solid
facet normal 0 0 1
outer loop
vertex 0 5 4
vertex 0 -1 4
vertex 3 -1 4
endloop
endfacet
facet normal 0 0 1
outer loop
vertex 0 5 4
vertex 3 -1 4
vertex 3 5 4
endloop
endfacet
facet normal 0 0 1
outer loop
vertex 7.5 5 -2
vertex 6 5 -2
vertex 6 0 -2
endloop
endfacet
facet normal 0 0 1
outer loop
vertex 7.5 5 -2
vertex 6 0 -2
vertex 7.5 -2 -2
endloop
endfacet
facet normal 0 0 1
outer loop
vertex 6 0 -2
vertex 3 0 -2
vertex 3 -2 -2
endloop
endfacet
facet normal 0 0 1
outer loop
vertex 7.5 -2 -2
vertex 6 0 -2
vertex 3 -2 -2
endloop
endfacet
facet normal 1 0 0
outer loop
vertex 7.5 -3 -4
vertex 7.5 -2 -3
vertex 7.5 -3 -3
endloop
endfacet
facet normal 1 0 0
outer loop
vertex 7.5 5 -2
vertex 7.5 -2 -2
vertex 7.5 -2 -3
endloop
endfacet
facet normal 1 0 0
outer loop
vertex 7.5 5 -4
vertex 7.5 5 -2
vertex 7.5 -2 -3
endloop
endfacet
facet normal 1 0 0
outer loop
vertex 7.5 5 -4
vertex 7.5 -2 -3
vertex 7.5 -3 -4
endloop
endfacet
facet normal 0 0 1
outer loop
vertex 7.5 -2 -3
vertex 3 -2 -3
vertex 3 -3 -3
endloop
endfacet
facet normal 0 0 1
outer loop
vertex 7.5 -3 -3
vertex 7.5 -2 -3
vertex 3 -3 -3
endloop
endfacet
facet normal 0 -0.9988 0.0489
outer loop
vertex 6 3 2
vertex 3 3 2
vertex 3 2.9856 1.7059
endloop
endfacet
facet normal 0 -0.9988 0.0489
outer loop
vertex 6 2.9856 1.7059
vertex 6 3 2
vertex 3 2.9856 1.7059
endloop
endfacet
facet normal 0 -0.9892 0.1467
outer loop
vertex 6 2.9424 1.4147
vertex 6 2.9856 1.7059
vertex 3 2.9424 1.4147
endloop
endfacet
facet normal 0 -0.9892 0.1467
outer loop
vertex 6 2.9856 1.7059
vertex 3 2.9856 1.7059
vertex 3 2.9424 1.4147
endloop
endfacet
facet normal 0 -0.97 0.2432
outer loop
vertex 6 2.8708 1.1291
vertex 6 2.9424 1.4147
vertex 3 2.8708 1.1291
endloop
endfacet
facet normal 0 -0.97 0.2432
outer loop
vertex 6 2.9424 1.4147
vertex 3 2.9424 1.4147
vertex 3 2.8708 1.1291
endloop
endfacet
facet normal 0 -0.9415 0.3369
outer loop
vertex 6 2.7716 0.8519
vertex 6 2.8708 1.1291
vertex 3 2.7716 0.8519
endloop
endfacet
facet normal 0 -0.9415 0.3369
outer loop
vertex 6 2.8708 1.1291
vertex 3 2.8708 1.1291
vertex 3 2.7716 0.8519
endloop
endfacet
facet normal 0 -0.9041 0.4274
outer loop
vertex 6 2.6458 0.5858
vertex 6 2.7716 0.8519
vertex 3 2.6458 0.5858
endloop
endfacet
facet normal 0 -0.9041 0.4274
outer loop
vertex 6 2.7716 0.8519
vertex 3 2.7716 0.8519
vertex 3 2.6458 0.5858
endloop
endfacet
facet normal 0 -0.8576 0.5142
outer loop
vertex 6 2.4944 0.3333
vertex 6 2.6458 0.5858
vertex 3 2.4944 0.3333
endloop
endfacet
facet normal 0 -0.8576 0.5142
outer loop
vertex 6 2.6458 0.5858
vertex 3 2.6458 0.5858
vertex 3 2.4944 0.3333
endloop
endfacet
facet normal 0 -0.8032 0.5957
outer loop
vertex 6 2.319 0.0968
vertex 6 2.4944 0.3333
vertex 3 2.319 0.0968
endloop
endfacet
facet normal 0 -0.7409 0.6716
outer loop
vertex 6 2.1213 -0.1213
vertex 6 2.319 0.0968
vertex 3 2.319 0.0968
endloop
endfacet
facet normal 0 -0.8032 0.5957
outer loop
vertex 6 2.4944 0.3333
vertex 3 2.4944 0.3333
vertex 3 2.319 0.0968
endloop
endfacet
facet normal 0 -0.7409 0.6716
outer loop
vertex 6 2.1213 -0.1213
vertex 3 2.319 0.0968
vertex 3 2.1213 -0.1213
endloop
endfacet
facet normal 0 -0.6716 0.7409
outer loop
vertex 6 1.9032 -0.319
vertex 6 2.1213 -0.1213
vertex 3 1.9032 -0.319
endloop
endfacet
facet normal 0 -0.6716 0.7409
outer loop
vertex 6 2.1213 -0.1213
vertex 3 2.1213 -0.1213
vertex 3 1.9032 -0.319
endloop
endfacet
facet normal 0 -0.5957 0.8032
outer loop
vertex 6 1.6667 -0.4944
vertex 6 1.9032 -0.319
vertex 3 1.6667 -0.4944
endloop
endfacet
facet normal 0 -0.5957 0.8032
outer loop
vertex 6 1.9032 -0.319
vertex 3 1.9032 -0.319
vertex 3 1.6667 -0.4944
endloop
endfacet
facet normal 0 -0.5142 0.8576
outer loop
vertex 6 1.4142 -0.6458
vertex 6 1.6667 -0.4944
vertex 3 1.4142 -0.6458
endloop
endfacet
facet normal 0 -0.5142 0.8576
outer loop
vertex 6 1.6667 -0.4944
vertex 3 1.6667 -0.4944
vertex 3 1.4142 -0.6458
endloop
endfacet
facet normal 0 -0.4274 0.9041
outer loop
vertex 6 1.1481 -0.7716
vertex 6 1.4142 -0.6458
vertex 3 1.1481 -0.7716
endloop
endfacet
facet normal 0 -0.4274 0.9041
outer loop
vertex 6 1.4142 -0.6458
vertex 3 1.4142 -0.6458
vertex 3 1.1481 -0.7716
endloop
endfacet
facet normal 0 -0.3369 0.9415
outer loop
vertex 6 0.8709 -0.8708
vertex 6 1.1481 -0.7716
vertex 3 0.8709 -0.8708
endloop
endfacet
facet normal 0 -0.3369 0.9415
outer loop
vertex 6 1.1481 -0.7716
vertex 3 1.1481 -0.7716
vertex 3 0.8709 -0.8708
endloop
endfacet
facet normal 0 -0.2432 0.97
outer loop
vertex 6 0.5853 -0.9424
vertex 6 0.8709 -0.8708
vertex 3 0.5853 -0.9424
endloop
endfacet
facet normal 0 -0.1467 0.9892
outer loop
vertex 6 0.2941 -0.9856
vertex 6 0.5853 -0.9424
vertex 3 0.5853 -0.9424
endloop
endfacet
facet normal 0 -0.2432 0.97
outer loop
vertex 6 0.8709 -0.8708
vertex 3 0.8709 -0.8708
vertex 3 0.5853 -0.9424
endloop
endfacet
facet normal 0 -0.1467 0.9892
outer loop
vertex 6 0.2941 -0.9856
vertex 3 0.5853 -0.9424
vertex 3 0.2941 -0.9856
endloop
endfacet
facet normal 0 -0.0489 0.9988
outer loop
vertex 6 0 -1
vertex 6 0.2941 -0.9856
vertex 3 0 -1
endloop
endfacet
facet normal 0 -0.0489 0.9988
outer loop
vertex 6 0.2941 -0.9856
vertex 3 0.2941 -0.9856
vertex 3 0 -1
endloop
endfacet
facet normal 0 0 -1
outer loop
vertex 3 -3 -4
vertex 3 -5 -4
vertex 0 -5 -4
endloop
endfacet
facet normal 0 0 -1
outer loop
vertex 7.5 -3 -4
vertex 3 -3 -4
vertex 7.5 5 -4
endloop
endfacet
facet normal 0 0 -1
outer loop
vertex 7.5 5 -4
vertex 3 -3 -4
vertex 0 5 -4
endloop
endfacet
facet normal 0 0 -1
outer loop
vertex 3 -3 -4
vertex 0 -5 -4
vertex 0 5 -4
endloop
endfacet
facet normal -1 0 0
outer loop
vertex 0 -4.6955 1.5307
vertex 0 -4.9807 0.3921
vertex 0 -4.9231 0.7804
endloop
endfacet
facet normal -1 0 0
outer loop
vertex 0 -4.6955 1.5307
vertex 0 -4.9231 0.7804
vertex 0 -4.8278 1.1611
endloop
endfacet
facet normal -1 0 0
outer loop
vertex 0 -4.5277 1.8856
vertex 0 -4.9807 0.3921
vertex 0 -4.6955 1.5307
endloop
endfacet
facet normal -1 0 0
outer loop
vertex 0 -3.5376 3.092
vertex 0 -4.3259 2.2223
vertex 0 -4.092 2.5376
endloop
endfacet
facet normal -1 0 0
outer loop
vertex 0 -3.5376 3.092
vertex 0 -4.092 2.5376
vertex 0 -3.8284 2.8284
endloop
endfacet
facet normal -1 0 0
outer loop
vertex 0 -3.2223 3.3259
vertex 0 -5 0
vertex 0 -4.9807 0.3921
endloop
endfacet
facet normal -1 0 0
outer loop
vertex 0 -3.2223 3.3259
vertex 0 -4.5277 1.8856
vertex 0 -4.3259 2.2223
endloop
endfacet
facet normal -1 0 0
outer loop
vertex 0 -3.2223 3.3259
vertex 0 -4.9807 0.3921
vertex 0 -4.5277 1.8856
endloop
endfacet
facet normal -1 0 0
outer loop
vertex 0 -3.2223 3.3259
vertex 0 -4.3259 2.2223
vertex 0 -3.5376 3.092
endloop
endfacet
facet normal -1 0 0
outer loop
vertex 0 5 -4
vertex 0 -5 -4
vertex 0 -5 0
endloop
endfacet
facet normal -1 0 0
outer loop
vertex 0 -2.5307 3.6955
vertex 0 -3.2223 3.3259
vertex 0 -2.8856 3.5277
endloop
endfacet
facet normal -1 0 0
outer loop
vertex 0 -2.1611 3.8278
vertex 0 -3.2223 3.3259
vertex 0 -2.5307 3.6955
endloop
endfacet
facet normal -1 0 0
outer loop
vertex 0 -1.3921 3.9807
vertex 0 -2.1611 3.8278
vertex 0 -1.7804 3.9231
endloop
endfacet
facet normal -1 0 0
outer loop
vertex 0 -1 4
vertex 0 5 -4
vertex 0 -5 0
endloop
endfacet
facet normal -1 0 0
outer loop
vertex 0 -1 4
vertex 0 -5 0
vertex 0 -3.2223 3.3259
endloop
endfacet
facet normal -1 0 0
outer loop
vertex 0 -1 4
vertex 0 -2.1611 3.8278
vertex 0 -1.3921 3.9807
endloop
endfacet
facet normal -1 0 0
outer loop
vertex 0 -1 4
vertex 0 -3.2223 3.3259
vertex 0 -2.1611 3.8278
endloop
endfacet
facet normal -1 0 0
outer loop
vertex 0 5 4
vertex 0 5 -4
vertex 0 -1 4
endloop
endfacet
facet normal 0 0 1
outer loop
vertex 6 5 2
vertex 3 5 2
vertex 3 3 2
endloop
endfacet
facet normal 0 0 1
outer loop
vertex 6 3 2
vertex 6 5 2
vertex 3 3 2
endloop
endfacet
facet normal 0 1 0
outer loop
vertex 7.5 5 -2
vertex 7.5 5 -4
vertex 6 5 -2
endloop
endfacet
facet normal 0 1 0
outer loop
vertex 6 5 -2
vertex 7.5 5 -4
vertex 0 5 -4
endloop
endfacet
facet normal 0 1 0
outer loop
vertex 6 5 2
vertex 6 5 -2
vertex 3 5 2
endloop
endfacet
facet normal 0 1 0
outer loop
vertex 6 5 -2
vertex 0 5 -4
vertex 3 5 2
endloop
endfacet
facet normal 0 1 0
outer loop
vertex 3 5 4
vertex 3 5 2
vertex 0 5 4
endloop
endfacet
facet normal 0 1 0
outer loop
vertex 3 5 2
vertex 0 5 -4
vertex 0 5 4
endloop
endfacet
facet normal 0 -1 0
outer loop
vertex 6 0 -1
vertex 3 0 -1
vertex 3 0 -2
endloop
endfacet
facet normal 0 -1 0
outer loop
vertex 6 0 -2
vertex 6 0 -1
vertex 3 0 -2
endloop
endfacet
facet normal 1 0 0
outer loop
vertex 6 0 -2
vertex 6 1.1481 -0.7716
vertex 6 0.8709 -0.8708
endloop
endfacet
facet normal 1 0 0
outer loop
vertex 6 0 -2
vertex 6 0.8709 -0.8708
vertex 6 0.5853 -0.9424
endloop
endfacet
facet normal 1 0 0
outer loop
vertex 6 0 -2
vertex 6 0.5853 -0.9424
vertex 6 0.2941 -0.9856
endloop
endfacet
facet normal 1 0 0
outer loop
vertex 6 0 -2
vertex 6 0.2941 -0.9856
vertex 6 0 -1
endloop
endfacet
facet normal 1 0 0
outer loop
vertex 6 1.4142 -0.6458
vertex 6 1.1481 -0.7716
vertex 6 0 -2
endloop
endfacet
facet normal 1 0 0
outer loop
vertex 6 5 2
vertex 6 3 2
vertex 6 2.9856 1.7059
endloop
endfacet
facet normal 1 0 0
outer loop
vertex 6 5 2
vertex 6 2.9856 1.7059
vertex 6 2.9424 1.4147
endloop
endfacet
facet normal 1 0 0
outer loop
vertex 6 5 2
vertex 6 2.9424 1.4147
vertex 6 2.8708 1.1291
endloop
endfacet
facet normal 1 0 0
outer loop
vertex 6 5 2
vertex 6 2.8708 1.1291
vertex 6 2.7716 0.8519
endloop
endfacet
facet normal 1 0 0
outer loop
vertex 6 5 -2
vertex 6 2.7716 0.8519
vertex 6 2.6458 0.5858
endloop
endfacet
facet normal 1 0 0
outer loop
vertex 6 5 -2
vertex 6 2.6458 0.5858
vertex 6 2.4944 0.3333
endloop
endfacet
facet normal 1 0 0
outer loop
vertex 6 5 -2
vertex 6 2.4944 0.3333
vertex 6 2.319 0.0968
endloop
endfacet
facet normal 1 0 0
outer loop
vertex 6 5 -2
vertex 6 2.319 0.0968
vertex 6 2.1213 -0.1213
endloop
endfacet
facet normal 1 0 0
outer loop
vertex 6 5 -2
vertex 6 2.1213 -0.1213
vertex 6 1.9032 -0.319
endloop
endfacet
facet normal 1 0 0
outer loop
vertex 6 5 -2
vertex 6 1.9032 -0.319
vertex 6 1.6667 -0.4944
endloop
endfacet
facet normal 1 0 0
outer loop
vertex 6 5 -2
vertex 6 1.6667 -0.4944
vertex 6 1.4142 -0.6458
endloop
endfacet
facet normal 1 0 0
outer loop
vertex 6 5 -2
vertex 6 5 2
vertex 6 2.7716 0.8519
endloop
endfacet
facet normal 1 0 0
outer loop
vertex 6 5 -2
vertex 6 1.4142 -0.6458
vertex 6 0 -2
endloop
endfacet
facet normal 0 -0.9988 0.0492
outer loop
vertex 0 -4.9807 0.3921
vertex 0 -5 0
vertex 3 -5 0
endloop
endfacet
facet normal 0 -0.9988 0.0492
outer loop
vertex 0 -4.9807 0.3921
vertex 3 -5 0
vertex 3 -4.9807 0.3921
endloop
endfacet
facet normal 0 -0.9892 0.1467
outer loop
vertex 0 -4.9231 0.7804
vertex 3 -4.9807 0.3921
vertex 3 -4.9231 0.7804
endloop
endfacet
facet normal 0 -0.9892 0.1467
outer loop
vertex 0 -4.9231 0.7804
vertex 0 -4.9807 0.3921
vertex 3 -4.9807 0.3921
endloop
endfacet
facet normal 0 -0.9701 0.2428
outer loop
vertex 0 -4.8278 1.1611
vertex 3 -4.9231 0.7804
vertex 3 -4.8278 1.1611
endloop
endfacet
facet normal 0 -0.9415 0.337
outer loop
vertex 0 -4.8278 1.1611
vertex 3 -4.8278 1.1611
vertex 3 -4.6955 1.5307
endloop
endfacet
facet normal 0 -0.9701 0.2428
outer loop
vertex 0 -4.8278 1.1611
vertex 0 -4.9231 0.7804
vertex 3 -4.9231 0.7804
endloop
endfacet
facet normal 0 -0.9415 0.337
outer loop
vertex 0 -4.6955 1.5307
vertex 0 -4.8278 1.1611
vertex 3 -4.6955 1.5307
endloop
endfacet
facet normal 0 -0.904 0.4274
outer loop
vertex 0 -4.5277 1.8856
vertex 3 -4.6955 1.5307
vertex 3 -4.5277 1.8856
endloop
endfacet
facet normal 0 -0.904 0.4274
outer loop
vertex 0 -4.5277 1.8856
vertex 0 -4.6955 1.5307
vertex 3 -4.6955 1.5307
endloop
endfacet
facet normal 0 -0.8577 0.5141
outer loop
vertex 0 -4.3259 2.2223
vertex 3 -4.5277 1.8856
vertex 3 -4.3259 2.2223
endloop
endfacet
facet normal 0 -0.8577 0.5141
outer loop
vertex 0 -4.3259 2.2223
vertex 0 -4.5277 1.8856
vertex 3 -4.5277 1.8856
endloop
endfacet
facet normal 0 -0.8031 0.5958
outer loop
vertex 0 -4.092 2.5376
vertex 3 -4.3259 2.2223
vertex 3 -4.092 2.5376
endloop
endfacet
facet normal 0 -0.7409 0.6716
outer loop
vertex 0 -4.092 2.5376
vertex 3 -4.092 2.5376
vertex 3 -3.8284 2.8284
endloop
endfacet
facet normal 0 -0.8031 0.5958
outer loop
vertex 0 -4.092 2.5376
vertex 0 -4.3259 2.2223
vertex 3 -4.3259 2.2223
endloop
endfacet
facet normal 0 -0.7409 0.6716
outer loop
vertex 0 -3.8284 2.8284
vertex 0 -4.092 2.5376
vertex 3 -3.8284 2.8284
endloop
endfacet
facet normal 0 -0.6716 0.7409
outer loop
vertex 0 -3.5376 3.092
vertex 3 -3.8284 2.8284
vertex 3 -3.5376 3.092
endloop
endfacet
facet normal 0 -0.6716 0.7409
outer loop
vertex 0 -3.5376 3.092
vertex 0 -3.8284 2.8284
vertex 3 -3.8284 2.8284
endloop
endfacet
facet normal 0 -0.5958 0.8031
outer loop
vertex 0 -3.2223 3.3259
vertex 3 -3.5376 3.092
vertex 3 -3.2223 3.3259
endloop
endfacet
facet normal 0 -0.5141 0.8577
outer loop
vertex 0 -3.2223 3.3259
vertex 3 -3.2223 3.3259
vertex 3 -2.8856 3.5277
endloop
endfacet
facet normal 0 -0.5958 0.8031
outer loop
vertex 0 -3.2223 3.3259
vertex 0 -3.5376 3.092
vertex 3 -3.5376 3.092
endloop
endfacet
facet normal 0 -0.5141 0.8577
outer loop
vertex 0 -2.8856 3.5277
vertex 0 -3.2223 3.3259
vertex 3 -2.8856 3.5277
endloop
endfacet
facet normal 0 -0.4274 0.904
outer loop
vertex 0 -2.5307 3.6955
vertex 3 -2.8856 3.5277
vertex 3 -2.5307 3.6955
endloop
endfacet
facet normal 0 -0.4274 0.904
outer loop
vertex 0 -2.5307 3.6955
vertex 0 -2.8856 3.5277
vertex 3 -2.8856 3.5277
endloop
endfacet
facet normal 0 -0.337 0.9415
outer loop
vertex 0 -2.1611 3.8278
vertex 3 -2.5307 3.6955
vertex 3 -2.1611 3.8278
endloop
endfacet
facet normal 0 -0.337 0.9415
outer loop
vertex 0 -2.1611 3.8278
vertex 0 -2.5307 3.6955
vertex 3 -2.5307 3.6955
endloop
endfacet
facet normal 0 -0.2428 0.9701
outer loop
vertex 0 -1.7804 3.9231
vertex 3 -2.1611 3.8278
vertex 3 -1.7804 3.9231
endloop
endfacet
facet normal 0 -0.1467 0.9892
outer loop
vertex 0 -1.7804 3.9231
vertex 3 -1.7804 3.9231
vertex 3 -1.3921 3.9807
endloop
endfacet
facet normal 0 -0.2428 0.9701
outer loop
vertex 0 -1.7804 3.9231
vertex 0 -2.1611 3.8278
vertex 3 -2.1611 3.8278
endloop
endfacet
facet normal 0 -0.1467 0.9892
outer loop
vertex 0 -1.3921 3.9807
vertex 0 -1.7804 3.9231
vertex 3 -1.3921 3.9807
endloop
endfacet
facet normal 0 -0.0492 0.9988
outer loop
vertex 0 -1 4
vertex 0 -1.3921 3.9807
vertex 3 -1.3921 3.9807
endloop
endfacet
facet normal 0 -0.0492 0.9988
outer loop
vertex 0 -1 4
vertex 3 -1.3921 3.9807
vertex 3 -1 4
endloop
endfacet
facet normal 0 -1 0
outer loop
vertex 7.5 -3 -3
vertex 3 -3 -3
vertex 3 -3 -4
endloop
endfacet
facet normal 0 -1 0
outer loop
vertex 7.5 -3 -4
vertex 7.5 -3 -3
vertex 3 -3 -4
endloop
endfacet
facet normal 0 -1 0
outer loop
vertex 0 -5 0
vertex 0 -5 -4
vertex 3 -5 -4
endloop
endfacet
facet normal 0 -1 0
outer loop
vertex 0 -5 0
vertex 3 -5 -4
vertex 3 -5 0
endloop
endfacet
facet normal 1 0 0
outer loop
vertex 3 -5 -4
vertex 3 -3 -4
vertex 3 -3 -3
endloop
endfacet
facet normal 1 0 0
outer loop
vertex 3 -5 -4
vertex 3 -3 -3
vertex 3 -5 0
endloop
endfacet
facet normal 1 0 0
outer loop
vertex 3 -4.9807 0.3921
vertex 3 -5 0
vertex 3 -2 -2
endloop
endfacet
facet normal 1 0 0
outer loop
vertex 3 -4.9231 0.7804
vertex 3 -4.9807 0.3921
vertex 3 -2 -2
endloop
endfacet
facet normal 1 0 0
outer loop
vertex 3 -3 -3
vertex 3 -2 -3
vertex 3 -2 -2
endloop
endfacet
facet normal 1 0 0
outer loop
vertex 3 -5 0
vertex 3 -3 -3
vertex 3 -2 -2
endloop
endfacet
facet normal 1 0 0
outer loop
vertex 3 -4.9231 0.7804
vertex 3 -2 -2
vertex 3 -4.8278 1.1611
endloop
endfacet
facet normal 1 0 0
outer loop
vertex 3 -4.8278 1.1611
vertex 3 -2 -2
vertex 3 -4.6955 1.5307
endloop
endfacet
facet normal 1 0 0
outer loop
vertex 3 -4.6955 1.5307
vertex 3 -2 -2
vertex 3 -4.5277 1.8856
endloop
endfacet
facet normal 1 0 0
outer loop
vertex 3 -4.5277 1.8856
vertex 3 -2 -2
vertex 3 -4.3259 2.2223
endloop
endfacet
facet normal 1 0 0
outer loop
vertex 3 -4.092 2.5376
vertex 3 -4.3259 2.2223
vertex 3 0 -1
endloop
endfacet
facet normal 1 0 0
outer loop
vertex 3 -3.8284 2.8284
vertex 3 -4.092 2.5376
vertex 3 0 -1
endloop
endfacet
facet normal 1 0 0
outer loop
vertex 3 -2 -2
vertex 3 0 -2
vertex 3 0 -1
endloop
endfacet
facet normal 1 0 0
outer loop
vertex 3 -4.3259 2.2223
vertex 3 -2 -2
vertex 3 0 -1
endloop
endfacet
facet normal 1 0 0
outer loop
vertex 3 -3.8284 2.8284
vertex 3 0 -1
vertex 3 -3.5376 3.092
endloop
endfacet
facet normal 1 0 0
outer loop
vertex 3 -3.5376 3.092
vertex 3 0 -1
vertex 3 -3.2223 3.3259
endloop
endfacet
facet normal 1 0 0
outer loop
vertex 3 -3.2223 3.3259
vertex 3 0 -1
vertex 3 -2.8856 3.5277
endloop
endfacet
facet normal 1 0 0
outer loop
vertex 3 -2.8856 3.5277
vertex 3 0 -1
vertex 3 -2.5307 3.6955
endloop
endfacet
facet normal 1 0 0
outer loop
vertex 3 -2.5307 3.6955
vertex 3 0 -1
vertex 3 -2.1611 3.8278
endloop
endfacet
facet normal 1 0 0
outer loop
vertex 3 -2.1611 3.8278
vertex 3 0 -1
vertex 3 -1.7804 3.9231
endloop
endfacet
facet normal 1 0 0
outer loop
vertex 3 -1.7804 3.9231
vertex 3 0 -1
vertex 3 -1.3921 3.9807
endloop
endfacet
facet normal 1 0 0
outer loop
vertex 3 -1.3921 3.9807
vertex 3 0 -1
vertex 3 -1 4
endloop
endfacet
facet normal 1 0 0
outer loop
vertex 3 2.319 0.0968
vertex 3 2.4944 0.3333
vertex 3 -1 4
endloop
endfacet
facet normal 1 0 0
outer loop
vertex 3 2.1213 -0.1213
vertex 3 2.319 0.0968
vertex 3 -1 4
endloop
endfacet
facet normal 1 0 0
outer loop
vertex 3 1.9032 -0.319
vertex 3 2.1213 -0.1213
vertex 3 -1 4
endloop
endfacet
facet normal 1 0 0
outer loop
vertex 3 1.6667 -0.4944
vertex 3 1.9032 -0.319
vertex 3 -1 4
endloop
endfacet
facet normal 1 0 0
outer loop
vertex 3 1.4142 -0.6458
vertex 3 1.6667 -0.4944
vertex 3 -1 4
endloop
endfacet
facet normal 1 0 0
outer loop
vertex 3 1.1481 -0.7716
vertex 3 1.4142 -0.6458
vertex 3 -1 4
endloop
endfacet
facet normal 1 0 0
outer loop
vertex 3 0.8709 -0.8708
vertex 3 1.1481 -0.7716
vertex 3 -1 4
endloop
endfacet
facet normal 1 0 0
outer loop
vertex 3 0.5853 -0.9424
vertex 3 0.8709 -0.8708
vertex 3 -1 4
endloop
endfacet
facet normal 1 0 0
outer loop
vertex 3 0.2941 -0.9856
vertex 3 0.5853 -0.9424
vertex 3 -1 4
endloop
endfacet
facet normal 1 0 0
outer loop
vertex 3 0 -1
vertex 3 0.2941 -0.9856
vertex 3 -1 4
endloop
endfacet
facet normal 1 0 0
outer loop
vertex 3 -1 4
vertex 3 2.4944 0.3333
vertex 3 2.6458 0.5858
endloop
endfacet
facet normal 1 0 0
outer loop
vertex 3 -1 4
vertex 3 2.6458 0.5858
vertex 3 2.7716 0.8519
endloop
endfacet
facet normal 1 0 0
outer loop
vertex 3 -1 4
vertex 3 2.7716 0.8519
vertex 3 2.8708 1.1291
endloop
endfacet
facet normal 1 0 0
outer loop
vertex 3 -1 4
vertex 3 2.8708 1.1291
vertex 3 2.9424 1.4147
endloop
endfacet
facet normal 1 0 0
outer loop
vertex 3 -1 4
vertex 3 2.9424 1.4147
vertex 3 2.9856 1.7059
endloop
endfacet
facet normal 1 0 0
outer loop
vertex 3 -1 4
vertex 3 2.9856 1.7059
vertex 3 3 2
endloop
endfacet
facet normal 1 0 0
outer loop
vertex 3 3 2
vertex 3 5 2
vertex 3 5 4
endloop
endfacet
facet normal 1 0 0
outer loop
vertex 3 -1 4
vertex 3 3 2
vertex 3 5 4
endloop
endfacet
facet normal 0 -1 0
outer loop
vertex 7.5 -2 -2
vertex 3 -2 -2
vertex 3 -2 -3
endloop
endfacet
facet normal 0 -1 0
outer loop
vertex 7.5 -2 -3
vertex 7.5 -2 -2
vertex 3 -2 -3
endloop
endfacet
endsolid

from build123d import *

# Parameters (mm, degrees)
BOSS_EXTRUDE1_DEPTH = 3
BOSS_EXTRUDE2_DEPTH = 4.5
BOSS_EXTRUDE3_DEPTH = 3


with BuildPart() as part:
    # Sketch1 → Boss-Extrude1 (new body)
    with BuildSketch(Plane(origin=(0, 0, 0), x_dir=(0, 0, -1), z_dir=(1, 0, 0))):
        with BuildLine():
            Line((4, -5), (0, -5))
            ThreePointArc((0, -5), (-2.828427125, -3.828427125), (-4, -1))
            Line((-4, -1), (-4, 5))
            Line((-4, 5), (4, 5))
            Line((4, 5), (4, -5))
        make_face()
    extrude(amount=BOSS_EXTRUDE1_DEPTH)

    # Sketch2 → Boss-Extrude2 (add)
    with BuildSketch(Plane(origin=(3, 0, 0), x_dir=(0, 0, -1), z_dir=(1, 0, 0))):
        Polygon((4, -3), (4, 5), (2, 5), (2, -2), (3, -2), (3, -3), align=None)
    extrude(amount=BOSS_EXTRUDE2_DEPTH)

    # Sketch3 → Boss-Extrude3 (add)
    with BuildSketch(Plane(origin=(3, 0, 0), x_dir=(0, 0, -1), z_dir=(1, 0, 0))):
        with BuildLine():
            Line((2, 0), (2, 5))
            Line((2, 5), (-2, 5))
            Line((-2, 5), (-2, 3))
            ThreePointArc((-2, 3), (0.121320344, 2.121320344), (1, 0))
            Line((1, 0), (2, 0))
        make_face()
    extrude(amount=BOSS_EXTRUDE3_DEPTH)


solid = part.part
